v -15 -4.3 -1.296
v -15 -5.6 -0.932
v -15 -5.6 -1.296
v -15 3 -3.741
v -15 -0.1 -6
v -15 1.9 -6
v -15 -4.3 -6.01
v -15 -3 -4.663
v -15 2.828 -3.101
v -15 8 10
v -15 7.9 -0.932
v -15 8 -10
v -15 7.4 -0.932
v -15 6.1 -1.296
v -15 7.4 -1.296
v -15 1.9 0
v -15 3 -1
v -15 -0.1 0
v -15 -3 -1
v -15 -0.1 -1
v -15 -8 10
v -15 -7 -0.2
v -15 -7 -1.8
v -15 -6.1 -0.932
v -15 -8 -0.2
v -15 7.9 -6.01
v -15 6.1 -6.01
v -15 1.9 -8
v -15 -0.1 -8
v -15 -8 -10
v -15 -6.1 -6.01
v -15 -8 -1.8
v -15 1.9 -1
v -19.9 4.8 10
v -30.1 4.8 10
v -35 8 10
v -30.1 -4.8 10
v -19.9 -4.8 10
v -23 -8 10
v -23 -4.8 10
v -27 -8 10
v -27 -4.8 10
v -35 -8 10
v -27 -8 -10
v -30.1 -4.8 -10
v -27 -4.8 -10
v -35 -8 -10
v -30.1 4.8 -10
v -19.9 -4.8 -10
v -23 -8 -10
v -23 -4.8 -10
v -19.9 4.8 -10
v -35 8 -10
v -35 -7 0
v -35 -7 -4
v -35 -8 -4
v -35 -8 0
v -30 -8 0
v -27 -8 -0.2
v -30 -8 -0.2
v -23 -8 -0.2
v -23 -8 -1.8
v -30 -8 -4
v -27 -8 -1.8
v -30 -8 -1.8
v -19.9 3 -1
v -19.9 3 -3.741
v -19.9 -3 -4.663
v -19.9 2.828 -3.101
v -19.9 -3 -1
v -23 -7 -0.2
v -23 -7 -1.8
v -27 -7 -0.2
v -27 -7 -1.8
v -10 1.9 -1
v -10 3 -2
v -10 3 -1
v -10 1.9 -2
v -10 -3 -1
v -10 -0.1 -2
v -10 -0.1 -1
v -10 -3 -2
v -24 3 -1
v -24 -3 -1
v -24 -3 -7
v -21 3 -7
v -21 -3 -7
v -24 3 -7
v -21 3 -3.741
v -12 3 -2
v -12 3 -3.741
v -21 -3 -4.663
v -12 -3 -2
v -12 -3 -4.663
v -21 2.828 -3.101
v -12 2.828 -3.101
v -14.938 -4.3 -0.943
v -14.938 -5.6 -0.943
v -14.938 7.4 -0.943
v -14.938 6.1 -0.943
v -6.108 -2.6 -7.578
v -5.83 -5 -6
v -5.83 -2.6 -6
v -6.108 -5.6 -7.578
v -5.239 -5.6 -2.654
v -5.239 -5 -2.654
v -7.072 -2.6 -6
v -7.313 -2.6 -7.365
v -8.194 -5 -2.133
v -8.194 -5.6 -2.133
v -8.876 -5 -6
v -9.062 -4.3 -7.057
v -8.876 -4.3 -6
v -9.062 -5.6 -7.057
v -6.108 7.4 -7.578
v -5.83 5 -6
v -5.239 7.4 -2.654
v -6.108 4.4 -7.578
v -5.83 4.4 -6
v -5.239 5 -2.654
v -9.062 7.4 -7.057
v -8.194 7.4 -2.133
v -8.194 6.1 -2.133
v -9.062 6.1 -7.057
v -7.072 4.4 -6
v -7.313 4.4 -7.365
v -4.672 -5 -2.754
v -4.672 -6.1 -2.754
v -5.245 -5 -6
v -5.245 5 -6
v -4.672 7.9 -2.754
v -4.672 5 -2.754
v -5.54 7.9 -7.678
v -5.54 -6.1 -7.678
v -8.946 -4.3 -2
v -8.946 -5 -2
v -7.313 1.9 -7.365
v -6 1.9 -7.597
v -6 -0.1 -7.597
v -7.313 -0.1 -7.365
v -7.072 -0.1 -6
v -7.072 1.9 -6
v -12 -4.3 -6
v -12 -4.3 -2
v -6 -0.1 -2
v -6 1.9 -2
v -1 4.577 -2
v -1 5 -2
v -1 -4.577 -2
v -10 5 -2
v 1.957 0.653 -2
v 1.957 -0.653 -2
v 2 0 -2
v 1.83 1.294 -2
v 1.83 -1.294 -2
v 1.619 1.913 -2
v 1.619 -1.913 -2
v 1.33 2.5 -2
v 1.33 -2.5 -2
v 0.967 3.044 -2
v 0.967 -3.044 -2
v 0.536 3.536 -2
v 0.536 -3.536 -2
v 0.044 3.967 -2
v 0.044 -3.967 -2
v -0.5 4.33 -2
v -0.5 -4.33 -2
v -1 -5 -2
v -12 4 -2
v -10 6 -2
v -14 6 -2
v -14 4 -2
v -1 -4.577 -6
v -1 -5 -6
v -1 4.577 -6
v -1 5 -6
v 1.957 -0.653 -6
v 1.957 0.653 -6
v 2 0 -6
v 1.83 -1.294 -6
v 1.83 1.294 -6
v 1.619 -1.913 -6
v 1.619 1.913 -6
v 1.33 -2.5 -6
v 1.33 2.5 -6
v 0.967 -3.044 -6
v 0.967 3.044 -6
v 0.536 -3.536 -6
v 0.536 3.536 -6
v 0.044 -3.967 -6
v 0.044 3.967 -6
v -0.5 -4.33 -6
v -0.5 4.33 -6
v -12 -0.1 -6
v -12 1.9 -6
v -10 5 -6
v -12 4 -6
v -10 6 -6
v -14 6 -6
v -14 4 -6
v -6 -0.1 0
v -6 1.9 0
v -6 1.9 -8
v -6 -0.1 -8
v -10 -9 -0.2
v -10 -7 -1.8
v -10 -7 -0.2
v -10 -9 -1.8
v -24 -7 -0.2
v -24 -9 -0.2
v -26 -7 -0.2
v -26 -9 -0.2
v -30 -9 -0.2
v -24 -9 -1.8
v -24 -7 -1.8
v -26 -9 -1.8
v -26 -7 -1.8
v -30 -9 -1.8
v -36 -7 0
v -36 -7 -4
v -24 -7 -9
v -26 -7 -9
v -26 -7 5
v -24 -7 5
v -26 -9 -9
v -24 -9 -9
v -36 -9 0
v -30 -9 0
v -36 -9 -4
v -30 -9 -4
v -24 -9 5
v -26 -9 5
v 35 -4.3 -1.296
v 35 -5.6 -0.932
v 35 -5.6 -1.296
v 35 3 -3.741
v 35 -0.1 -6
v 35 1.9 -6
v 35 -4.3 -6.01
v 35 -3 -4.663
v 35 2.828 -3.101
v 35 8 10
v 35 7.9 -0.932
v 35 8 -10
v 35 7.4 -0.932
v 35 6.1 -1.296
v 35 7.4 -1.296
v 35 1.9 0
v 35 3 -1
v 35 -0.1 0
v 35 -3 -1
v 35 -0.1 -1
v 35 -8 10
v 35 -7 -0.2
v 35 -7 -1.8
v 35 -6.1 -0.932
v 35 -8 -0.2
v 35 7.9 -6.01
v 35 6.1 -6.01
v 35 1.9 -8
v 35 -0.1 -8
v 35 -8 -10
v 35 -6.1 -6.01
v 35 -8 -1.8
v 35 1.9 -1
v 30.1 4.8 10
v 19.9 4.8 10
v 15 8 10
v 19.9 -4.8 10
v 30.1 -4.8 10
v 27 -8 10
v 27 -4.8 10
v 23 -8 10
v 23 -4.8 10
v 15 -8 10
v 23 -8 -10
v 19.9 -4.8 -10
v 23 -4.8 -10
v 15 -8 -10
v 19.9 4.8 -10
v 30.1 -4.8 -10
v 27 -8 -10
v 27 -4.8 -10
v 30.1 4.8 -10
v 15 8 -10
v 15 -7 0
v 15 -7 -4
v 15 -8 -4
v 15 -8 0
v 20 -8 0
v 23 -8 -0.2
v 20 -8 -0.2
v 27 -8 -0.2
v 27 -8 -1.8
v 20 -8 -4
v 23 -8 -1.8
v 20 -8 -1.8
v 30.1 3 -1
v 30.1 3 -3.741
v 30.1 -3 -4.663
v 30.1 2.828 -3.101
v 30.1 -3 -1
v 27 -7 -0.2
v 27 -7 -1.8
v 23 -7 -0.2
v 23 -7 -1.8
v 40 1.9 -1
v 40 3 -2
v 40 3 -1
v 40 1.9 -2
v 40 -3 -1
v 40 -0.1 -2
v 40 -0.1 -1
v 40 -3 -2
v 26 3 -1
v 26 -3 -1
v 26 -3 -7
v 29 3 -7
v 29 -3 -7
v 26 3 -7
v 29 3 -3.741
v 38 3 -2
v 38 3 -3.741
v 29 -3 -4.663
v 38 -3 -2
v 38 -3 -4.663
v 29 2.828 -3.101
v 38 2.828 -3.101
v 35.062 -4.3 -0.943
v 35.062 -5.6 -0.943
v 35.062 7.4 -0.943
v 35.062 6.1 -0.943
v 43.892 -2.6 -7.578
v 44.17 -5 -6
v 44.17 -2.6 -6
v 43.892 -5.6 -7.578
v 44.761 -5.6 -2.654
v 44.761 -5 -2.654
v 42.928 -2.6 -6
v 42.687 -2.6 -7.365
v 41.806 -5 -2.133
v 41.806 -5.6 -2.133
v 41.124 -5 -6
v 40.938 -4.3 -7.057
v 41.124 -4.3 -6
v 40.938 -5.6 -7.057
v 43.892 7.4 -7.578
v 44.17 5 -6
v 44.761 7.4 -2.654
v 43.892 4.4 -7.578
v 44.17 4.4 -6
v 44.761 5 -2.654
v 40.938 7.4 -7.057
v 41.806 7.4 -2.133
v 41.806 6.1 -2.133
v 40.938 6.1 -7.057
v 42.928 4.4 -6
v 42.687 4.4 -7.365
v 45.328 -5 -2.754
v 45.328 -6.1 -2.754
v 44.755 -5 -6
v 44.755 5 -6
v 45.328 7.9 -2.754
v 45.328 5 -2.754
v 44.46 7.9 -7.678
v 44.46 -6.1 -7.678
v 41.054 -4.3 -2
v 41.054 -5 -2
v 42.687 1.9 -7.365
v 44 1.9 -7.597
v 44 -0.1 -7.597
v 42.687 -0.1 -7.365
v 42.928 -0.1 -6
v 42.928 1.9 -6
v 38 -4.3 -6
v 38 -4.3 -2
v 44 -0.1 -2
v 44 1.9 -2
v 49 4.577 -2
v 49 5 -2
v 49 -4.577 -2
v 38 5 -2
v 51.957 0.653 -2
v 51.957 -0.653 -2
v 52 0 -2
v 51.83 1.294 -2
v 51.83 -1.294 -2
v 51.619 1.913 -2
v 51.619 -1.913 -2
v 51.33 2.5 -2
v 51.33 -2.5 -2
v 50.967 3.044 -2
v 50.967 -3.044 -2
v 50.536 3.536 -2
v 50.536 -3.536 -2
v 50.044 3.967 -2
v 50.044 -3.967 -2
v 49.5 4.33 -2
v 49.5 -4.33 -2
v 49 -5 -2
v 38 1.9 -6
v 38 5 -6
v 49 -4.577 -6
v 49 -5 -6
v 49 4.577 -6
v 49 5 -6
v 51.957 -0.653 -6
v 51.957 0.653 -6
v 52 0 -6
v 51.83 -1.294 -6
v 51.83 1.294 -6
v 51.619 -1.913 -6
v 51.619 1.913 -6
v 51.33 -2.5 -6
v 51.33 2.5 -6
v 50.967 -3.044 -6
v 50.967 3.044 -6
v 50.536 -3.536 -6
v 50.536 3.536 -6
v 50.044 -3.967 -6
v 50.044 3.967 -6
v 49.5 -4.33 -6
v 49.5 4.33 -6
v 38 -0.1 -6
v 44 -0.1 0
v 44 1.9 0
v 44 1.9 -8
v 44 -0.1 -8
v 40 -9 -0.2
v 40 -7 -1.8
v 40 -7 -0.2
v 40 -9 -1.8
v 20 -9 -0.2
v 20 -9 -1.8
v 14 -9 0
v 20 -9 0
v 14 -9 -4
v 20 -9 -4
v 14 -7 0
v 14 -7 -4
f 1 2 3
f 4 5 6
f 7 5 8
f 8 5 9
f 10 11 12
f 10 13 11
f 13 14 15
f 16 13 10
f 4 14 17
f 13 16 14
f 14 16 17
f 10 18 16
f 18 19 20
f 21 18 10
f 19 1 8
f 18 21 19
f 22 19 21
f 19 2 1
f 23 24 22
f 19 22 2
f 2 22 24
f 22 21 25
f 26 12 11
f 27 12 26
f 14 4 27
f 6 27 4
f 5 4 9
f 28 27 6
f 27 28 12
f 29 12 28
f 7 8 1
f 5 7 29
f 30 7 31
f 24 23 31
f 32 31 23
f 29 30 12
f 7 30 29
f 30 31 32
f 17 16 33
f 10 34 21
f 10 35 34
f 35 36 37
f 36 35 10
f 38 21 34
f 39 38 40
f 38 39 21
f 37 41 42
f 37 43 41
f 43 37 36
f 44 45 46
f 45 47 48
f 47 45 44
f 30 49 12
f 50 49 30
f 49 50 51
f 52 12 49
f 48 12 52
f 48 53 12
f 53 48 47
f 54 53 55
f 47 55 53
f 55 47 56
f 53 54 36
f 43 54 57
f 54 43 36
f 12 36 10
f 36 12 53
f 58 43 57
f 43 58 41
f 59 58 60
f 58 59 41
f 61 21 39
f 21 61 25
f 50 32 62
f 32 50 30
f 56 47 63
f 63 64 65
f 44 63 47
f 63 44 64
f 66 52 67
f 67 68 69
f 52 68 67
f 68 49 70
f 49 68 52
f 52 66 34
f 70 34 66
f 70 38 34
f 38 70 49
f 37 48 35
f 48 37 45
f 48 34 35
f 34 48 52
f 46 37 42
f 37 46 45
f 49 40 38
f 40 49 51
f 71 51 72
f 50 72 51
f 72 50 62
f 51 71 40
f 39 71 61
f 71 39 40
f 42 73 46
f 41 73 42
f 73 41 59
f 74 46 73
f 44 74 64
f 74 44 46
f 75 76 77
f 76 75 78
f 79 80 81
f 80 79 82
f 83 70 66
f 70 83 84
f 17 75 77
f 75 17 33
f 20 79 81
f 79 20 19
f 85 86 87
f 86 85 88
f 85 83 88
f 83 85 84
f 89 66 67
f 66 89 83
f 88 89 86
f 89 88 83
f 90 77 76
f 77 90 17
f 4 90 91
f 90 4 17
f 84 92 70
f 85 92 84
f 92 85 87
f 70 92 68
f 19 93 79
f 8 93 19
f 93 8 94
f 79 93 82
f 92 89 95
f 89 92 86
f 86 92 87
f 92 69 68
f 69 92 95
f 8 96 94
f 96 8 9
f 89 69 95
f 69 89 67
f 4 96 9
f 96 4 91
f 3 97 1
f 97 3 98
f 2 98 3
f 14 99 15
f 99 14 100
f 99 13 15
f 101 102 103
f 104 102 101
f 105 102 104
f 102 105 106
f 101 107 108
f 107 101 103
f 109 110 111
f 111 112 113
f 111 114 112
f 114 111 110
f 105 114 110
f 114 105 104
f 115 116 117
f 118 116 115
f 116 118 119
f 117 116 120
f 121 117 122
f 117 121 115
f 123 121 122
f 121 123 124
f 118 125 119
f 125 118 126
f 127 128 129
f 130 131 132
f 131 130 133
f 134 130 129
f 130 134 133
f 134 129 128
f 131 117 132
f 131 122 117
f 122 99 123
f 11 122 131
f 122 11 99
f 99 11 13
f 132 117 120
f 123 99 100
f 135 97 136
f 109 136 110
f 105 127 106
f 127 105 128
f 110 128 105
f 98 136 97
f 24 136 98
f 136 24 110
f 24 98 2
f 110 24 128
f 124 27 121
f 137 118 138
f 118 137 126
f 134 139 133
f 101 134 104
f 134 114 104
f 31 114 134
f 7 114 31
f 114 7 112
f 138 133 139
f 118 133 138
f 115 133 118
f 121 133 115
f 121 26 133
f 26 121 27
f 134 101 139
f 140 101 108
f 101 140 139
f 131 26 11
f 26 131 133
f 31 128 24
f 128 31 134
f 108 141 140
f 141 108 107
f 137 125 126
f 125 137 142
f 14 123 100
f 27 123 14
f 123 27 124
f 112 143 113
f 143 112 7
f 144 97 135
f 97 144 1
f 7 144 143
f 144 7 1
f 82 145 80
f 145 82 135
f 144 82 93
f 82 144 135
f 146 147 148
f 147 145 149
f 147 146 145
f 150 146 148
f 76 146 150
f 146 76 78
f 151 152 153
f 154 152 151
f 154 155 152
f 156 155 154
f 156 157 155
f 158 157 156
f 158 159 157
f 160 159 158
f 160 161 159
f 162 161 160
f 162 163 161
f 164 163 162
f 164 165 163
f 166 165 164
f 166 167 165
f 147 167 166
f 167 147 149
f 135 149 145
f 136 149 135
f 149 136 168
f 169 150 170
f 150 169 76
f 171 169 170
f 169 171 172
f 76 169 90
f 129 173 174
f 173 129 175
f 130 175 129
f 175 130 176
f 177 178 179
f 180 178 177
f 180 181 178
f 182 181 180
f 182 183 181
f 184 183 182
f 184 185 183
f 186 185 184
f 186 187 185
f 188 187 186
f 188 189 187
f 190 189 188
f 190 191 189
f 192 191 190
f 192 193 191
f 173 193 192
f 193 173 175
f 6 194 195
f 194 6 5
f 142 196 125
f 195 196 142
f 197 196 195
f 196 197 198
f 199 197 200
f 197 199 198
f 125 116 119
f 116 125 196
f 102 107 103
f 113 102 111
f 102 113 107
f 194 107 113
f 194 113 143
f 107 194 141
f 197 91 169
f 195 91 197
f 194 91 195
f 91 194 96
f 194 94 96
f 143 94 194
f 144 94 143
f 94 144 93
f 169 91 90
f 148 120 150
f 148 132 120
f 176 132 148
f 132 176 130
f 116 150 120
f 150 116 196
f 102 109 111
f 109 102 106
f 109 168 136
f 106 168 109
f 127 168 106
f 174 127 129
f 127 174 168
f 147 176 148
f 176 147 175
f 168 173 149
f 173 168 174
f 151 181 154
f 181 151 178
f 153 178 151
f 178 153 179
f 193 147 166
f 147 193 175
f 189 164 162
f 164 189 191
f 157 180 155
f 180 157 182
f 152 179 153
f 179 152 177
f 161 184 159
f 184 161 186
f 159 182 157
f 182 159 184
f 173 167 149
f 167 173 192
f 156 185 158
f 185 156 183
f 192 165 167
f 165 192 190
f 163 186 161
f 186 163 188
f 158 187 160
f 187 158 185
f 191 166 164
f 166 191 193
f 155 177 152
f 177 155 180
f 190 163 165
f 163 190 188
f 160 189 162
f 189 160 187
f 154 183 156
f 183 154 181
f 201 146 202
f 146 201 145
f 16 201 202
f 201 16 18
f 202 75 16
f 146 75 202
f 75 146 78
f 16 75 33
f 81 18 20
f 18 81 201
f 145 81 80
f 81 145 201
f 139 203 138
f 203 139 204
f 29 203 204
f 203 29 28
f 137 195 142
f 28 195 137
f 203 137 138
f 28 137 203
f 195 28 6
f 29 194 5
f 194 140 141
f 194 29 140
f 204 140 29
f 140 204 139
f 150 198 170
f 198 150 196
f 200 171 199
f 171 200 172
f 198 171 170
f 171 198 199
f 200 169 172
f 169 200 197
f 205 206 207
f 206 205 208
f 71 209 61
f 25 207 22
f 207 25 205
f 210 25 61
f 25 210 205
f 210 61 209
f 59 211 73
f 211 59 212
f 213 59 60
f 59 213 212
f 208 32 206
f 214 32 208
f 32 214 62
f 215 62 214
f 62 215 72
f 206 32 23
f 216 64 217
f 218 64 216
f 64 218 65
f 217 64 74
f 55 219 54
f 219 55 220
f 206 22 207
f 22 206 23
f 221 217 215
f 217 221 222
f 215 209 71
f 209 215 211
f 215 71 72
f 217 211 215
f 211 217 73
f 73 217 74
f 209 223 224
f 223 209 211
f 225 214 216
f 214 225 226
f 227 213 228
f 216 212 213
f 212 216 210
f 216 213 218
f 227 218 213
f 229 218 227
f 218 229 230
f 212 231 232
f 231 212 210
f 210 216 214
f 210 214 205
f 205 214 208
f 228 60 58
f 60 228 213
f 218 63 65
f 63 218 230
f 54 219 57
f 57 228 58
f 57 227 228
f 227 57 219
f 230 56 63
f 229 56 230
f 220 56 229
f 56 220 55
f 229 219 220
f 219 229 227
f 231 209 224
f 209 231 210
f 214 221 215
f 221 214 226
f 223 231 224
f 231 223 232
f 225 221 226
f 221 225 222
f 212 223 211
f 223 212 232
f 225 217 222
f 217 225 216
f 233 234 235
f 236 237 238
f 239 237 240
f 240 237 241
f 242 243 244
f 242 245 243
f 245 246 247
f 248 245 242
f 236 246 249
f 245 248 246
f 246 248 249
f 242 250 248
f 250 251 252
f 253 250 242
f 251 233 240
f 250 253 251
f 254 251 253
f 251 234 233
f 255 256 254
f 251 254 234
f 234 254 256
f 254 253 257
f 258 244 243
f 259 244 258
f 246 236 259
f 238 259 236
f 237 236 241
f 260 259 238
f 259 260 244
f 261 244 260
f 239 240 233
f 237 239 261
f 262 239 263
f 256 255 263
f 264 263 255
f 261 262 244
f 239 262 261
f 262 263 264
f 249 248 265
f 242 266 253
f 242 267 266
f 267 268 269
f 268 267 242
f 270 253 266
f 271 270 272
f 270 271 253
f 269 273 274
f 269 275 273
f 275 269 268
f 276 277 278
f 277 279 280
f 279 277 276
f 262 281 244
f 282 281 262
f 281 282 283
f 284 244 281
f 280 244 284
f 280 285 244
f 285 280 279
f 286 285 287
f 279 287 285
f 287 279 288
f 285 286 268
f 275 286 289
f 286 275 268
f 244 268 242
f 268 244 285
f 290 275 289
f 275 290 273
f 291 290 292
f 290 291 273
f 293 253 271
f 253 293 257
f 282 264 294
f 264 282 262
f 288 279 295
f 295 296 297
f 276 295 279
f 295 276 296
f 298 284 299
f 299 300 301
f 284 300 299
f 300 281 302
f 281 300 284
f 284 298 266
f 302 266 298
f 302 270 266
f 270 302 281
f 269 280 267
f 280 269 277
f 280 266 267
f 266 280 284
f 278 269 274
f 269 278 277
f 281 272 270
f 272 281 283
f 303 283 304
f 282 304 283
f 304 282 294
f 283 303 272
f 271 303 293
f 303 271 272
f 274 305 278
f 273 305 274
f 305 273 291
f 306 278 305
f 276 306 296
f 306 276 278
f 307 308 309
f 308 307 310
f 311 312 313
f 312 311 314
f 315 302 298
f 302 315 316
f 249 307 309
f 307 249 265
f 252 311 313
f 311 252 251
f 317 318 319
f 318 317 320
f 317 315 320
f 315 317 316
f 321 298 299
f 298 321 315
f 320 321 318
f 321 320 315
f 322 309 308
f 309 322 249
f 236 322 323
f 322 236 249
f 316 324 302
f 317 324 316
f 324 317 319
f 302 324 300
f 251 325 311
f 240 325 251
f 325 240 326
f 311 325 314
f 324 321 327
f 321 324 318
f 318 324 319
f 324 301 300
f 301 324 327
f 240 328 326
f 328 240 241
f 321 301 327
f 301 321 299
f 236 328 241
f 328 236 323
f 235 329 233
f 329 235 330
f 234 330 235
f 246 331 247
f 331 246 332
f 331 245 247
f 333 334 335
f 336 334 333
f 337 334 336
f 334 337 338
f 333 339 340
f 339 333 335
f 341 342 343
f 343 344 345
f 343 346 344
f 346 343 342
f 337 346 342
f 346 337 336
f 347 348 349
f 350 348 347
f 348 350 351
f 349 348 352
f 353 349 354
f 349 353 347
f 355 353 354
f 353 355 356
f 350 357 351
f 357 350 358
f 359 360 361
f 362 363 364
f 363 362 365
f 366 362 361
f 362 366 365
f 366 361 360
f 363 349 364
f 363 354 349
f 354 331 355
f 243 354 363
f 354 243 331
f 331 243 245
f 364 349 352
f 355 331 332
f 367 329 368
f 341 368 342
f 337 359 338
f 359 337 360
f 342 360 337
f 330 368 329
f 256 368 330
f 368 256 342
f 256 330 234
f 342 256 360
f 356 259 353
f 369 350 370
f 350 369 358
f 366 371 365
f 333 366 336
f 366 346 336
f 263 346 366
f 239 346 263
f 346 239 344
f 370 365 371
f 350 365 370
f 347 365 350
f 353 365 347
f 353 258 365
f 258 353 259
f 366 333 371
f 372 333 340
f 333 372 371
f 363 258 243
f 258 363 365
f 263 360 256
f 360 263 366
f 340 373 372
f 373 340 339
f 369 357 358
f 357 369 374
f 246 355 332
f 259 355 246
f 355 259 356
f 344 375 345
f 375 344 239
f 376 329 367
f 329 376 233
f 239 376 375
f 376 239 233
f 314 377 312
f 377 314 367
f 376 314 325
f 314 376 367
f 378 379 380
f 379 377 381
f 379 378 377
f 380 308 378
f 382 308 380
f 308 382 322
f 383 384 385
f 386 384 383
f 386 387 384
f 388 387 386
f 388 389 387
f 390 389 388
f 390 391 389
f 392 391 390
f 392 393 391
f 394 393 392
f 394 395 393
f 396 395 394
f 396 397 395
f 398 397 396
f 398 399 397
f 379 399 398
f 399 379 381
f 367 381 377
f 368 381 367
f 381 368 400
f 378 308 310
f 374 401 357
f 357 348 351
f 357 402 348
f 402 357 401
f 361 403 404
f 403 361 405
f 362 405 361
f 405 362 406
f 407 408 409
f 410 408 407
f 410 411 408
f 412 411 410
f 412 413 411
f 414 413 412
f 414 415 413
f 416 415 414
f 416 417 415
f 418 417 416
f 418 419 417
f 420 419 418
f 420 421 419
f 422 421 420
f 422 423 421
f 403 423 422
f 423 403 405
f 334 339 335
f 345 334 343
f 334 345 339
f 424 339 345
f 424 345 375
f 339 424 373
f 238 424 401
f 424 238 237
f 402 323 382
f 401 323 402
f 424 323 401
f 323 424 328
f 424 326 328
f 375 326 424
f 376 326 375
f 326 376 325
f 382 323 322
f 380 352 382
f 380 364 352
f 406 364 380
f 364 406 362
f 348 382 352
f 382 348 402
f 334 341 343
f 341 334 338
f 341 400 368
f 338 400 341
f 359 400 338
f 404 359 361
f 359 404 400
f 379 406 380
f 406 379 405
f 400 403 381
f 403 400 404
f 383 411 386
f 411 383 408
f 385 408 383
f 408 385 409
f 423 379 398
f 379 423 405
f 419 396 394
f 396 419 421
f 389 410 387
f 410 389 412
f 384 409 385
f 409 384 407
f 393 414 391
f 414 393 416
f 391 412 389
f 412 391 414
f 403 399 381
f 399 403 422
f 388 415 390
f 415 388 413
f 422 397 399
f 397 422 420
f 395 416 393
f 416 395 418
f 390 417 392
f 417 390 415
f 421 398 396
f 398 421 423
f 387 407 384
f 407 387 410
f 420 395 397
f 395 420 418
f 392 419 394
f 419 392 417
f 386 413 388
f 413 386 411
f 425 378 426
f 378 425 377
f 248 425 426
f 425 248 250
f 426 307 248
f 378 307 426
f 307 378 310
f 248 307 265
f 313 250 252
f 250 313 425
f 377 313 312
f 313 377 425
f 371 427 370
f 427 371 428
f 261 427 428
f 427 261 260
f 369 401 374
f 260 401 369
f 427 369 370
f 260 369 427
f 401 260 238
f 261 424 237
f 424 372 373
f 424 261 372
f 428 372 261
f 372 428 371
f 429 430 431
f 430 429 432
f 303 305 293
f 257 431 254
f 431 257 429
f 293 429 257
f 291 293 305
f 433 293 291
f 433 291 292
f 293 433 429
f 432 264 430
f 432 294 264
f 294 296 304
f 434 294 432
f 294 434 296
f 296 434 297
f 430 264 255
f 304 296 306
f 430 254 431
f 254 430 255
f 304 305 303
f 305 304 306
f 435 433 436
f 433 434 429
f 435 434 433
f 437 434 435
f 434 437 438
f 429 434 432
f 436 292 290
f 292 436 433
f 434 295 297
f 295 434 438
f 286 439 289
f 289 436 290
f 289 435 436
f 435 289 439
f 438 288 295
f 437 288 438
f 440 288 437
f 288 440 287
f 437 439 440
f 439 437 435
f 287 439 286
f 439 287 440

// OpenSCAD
// MSKR Saddle – CSG-style OpenSCAD model
// Save as: saddle.scad (or saddle.csg if your tool accepts it)

$fn = 48;

module saddle(is_left = true) {

    // ----- Clip -----
    difference() {
        // outer
        translate([0,0,0])
            cube([20,16,20], center=true);

        // inner cavity
        translate([0,0,0])
            cube([10.2,9.6,22], center=true);

        // opening
        translate([0,-12,0])
            cube([4,24,24], center=true);
    }

    // ----- Forward arm -----
    difference() {
        translate([8,0,-4])
            cube([14,6,6], center=true);

        translate([12,0,-8])
            rotate([15,0,0])
                cube([16,8,8], center=true);
    }

    // ----- Motor cradle -----
    difference() {
        // outer
        translate([13,0.9,-4])
            rotate([0,10,0])
                cube([14,14,5], center=true);

        // inner cavity
        translate([13,0.9,-4])
            rotate([0,10,0])
                cube([10.4,10.4,6], center=true);

        // corner reliefs
        for (sx = [-1,1], sy = [-1,1])
            translate([13 + sx*5, 0.9 + sy*5, -4])
                rotate([0,10,0])
                    cube([3,3,8], center=true);
    }

    // ----- Lips -----
    // top
    translate([13,0.9,-1])
        cube([12,2,2], center=true);

    // bottom
    translate([13,0.9,-7])
        cube([12,2,2], center=true);

    // ----- Anti-rotation tab (left only) -----
    if (is_left) {
        translate([13,5,-4])
            cube([4,2,4], center=true);
    }

    // ----- Wire channels -----
    // top groove
    difference() {
        // nothing to subtract from here; these are conceptual cuts
    }

    // top groove cut
    translate([4,-8,-1])
        cube([22,2,1.6], center=true);

    // rear relief
    translate([-8,-8,-2])
        cube([6,2,4], center=true);

    // downward groove (left only)
    if (is_left) {
        translate([0,-8,-2])
            cube([2,2,14], center=true);
    }

    // ----- Mastoid pad -----
    union() {
        translate([18,0,-4])
            cube([10,10,4], center=true);

        translate([21,0,-4])
            cube([6,10,4], center=true);

        translate([22,0,-4])
            cylinder(r=5, h=4, center=true);
    }
}

// Left and right saddles, spaced apart
translate([-25,0,0]) saddle(true);
translate([ 25,0,0]) saddle(false);
